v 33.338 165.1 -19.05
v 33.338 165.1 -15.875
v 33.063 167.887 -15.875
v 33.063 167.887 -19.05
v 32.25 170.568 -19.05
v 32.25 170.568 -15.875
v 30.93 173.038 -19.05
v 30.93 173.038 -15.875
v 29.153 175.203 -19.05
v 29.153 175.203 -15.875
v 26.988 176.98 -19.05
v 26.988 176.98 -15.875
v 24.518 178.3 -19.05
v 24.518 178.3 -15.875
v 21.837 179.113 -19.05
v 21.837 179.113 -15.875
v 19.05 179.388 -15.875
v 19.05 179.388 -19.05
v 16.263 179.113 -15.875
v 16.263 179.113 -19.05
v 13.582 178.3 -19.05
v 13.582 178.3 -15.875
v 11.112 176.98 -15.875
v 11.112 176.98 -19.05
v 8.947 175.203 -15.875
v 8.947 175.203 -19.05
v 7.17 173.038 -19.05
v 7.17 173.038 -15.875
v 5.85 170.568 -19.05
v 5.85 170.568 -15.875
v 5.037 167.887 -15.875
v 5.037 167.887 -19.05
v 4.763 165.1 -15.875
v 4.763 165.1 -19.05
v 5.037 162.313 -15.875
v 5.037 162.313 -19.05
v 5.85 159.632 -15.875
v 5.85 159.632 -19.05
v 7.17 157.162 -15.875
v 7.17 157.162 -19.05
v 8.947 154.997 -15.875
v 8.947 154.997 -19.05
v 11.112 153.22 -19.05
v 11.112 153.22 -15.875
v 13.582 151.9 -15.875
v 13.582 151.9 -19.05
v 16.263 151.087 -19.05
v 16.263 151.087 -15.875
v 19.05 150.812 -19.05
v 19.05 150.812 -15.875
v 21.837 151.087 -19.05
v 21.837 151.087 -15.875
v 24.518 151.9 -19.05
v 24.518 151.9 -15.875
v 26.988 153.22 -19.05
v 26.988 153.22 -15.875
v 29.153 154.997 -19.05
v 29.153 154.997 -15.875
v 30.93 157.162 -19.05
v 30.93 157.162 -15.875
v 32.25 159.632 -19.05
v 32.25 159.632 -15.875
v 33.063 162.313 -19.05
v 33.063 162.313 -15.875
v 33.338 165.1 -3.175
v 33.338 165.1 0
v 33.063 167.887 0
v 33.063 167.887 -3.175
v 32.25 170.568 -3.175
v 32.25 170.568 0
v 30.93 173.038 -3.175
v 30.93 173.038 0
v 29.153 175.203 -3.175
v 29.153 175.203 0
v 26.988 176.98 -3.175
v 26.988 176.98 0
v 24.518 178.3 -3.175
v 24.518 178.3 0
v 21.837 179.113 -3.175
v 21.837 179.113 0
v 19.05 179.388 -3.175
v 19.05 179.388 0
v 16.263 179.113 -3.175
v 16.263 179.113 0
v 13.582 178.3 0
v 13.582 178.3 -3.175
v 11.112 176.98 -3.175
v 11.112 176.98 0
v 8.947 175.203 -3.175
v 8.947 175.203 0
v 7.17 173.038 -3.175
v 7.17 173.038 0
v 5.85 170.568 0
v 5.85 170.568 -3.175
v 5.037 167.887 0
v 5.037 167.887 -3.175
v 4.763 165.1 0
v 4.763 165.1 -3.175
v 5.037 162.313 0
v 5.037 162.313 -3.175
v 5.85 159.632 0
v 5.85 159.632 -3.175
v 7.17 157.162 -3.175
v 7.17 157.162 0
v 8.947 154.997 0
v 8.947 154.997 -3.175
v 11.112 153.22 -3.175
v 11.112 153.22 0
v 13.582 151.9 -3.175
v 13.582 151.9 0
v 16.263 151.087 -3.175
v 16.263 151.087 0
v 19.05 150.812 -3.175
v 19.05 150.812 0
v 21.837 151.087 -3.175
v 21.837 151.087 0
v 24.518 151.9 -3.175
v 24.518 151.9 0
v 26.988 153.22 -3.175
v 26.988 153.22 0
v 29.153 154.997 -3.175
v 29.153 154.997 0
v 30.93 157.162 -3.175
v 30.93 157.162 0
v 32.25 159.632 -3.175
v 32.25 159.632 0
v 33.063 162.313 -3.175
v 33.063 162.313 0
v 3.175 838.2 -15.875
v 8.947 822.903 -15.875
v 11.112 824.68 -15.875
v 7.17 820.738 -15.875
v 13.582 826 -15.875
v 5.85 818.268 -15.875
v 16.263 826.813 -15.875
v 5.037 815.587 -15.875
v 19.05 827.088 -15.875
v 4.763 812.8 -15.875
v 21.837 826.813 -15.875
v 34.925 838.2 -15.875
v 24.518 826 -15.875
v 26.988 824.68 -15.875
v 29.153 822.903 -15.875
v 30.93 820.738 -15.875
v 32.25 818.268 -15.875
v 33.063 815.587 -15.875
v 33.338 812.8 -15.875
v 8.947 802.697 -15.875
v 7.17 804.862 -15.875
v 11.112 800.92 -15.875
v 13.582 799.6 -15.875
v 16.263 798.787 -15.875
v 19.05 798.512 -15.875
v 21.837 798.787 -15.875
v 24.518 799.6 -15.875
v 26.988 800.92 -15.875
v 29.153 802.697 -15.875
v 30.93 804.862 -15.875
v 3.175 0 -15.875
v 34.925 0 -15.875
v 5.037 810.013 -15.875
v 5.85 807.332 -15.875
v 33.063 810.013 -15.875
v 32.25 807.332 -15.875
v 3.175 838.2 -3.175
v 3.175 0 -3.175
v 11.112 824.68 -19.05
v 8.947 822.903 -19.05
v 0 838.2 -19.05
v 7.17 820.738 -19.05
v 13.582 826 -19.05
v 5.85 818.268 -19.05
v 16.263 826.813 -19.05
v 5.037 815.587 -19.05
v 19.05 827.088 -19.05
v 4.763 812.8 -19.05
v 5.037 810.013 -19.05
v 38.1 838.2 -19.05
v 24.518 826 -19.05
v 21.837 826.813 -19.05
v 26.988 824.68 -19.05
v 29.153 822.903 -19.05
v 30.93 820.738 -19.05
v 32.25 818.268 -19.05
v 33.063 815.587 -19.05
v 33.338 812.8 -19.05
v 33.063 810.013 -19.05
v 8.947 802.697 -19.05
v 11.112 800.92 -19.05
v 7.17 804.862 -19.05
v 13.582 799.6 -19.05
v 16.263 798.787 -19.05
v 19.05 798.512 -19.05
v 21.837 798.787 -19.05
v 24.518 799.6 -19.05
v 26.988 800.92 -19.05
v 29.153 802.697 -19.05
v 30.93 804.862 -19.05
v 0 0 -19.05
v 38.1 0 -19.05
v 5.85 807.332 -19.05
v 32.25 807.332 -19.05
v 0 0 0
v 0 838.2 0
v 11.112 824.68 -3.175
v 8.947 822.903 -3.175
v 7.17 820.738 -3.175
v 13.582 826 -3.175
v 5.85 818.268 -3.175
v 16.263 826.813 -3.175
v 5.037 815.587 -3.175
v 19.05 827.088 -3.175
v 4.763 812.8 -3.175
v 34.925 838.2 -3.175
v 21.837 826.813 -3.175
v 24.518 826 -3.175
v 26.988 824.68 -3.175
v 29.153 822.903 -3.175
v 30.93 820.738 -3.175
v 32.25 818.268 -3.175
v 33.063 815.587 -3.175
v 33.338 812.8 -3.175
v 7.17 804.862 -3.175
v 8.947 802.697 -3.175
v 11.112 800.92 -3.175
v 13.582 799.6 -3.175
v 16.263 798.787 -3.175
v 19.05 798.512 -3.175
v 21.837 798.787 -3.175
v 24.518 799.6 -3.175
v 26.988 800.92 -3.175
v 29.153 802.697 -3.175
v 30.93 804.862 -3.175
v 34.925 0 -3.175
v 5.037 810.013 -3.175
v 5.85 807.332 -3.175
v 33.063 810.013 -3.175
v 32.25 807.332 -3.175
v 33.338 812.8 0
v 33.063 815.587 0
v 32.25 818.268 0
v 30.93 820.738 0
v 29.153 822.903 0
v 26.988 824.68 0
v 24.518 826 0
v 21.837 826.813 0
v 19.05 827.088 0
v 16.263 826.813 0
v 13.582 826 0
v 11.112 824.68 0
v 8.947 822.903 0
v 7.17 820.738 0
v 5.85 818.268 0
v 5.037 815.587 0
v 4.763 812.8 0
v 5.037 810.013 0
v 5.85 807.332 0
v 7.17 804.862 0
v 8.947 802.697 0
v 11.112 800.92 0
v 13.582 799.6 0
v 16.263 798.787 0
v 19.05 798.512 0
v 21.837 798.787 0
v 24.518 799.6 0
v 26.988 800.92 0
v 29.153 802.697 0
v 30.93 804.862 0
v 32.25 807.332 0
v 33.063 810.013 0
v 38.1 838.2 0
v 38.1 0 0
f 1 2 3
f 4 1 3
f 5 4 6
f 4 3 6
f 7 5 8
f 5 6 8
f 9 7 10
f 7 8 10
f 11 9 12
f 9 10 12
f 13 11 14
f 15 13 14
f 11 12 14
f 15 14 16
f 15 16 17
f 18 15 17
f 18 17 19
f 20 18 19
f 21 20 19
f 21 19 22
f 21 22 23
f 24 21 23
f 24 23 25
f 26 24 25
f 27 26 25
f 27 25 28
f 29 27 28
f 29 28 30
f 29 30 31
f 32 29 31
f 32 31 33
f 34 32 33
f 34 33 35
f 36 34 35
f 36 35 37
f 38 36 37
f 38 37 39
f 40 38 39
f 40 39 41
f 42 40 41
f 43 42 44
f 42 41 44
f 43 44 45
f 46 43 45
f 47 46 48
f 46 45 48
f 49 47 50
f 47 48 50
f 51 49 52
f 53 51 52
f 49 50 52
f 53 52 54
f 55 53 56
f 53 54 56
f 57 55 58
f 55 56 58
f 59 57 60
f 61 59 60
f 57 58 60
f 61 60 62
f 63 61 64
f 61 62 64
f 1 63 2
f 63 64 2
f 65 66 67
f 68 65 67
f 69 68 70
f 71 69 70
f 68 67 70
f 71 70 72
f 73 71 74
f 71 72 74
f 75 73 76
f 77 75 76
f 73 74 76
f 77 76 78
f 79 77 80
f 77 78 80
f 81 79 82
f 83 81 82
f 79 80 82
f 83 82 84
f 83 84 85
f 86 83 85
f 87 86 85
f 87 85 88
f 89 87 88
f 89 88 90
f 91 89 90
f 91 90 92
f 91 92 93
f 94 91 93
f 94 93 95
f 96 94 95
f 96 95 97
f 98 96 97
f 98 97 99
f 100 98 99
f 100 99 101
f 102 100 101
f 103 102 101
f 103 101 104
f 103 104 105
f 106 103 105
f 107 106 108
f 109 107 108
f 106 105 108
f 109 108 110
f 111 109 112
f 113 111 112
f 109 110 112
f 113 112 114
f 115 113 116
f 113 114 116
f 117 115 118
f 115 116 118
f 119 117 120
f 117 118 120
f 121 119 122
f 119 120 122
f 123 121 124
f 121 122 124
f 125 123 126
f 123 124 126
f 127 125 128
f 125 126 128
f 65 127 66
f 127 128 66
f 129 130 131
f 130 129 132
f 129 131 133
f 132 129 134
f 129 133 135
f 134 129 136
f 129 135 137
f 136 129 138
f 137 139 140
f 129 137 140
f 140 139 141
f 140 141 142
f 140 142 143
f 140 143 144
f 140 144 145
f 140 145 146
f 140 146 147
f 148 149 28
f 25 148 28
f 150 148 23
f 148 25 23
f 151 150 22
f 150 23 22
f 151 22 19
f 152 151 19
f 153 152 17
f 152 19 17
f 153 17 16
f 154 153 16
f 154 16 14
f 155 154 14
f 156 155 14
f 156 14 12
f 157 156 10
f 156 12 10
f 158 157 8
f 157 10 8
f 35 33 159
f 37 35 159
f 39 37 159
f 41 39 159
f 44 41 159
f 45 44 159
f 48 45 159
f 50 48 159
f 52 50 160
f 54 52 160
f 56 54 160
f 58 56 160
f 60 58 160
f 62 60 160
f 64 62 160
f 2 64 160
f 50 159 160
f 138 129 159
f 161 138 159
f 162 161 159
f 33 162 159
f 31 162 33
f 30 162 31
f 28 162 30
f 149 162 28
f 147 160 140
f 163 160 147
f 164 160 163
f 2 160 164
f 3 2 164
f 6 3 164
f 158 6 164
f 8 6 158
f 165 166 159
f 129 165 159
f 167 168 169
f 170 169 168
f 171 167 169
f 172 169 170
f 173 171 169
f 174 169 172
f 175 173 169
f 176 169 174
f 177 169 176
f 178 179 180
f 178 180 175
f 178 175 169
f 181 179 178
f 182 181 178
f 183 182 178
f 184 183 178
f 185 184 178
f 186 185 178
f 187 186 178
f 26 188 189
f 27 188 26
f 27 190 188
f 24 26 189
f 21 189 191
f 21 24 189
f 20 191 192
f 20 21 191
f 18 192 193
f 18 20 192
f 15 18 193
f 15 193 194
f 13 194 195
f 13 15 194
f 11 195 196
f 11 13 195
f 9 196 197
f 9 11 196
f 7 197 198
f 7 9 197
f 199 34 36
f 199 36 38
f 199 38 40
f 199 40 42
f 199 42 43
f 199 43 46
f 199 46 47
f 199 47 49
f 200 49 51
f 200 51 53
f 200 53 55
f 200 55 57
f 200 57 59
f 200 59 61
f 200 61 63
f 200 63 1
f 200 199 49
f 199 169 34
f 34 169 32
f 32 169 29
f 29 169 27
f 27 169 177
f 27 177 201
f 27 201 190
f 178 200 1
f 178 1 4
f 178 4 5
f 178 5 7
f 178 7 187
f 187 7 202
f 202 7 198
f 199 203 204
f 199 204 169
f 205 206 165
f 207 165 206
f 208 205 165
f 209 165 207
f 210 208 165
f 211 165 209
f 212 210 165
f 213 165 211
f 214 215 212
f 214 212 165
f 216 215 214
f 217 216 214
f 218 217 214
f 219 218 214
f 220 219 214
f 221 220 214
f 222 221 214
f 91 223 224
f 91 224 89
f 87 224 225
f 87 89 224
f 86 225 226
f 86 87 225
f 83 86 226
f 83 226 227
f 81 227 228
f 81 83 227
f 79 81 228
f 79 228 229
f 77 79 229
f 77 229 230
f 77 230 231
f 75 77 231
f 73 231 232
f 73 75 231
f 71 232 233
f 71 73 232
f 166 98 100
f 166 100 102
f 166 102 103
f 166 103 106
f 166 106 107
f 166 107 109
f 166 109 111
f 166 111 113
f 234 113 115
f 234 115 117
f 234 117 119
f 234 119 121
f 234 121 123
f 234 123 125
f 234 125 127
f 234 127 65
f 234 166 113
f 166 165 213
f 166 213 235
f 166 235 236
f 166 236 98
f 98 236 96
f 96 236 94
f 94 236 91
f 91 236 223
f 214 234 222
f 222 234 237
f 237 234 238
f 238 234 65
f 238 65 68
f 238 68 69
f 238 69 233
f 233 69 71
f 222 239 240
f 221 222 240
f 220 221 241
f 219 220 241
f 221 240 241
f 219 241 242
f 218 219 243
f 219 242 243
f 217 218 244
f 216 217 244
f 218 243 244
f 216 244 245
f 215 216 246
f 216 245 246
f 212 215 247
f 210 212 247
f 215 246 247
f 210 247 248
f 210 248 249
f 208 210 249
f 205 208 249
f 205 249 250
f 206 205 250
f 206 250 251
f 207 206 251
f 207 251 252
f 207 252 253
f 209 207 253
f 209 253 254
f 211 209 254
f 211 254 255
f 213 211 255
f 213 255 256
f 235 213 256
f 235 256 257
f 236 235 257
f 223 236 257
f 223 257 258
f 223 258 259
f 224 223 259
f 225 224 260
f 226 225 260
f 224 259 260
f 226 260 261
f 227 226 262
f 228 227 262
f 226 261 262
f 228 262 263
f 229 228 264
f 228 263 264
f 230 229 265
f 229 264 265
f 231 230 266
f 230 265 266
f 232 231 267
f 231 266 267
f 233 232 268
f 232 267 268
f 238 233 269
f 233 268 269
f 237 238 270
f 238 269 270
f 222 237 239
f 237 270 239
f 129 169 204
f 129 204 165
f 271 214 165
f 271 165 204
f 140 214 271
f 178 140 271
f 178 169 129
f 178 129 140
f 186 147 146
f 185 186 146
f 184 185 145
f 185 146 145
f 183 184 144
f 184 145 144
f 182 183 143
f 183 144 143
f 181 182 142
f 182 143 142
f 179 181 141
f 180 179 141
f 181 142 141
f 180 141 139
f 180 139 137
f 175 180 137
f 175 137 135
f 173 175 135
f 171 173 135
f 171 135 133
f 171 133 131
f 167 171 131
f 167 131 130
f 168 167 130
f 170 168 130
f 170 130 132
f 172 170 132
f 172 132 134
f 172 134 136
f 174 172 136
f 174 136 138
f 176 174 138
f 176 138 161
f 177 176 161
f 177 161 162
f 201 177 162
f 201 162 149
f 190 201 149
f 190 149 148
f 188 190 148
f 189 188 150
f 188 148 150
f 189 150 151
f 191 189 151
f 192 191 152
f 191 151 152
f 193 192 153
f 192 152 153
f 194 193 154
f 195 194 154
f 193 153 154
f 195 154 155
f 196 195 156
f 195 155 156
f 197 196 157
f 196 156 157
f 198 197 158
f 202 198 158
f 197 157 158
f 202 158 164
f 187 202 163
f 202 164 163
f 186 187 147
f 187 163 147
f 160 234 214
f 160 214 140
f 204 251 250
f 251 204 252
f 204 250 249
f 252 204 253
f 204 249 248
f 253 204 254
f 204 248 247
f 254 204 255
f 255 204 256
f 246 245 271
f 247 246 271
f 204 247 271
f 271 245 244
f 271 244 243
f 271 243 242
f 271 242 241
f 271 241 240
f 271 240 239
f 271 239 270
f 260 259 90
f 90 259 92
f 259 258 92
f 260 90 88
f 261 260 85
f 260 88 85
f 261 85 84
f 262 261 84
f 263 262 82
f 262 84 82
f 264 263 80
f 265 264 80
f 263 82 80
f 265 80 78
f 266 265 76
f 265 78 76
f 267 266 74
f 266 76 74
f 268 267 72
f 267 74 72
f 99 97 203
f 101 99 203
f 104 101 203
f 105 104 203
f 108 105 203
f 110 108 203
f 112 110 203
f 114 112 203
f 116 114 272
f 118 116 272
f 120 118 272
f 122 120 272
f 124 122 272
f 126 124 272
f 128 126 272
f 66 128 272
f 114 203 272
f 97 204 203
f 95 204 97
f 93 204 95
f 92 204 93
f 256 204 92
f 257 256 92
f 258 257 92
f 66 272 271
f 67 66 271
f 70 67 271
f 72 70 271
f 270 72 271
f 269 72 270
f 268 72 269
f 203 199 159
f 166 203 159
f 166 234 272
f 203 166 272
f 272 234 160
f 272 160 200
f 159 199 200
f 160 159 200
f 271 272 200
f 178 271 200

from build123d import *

# Parameters (mm, degrees)
SKETCH1_W           = 38.1
SKETCH1_H           = 19.05
SKETCH1_W_2         = 31.75
SKETCH1_H_2         = 12.7
EXTRUDE_THIN1_DEPTH = 838.2
SKETCH2_R           = 14.2875
CUT_EXTRUDE1_DEPTH  = 840.28168841
SKETCH3_R           = 14.2875
CUT_EXTRUDE2_DEPTH  = 840.28168841


with BuildPart() as part:
    # Sketch1 → Extrude-Thin1 (new body)
    with BuildSketch(Plane(origin=(0, 0, 0), x_dir=(1, 0, 0), z_dir=(0, 1, 0))):
        with Locations((19.05, 9.525)):
            Rectangle(SKETCH1_W, SKETCH1_H)
        with Locations((19.05, 9.525)):
            Rectangle(SKETCH1_W_2, SKETCH1_H_2, mode=Mode.SUBTRACT)
    extrude(amount=EXTRUDE_THIN1_DEPTH)

    # Sketch2 → Cut-Extrude1 (cut, through all)
    with BuildSketch(Plane.XY):
        with Locations((19.05, 165.1)):
            Circle(SKETCH2_R)
    extrude(amount=-CUT_EXTRUDE1_DEPTH, mode=Mode.SUBTRACT)

    # Sketch3 → Cut-Extrude2 (cut, through all)
    with BuildSketch(Plane.XY):
        with Locations((19.05, 812.8)):
            Circle(SKETCH3_R)
    extrude(amount=-CUT_EXTRUDE2_DEPTH, mode=Mode.SUBTRACT)


solid = part.part
